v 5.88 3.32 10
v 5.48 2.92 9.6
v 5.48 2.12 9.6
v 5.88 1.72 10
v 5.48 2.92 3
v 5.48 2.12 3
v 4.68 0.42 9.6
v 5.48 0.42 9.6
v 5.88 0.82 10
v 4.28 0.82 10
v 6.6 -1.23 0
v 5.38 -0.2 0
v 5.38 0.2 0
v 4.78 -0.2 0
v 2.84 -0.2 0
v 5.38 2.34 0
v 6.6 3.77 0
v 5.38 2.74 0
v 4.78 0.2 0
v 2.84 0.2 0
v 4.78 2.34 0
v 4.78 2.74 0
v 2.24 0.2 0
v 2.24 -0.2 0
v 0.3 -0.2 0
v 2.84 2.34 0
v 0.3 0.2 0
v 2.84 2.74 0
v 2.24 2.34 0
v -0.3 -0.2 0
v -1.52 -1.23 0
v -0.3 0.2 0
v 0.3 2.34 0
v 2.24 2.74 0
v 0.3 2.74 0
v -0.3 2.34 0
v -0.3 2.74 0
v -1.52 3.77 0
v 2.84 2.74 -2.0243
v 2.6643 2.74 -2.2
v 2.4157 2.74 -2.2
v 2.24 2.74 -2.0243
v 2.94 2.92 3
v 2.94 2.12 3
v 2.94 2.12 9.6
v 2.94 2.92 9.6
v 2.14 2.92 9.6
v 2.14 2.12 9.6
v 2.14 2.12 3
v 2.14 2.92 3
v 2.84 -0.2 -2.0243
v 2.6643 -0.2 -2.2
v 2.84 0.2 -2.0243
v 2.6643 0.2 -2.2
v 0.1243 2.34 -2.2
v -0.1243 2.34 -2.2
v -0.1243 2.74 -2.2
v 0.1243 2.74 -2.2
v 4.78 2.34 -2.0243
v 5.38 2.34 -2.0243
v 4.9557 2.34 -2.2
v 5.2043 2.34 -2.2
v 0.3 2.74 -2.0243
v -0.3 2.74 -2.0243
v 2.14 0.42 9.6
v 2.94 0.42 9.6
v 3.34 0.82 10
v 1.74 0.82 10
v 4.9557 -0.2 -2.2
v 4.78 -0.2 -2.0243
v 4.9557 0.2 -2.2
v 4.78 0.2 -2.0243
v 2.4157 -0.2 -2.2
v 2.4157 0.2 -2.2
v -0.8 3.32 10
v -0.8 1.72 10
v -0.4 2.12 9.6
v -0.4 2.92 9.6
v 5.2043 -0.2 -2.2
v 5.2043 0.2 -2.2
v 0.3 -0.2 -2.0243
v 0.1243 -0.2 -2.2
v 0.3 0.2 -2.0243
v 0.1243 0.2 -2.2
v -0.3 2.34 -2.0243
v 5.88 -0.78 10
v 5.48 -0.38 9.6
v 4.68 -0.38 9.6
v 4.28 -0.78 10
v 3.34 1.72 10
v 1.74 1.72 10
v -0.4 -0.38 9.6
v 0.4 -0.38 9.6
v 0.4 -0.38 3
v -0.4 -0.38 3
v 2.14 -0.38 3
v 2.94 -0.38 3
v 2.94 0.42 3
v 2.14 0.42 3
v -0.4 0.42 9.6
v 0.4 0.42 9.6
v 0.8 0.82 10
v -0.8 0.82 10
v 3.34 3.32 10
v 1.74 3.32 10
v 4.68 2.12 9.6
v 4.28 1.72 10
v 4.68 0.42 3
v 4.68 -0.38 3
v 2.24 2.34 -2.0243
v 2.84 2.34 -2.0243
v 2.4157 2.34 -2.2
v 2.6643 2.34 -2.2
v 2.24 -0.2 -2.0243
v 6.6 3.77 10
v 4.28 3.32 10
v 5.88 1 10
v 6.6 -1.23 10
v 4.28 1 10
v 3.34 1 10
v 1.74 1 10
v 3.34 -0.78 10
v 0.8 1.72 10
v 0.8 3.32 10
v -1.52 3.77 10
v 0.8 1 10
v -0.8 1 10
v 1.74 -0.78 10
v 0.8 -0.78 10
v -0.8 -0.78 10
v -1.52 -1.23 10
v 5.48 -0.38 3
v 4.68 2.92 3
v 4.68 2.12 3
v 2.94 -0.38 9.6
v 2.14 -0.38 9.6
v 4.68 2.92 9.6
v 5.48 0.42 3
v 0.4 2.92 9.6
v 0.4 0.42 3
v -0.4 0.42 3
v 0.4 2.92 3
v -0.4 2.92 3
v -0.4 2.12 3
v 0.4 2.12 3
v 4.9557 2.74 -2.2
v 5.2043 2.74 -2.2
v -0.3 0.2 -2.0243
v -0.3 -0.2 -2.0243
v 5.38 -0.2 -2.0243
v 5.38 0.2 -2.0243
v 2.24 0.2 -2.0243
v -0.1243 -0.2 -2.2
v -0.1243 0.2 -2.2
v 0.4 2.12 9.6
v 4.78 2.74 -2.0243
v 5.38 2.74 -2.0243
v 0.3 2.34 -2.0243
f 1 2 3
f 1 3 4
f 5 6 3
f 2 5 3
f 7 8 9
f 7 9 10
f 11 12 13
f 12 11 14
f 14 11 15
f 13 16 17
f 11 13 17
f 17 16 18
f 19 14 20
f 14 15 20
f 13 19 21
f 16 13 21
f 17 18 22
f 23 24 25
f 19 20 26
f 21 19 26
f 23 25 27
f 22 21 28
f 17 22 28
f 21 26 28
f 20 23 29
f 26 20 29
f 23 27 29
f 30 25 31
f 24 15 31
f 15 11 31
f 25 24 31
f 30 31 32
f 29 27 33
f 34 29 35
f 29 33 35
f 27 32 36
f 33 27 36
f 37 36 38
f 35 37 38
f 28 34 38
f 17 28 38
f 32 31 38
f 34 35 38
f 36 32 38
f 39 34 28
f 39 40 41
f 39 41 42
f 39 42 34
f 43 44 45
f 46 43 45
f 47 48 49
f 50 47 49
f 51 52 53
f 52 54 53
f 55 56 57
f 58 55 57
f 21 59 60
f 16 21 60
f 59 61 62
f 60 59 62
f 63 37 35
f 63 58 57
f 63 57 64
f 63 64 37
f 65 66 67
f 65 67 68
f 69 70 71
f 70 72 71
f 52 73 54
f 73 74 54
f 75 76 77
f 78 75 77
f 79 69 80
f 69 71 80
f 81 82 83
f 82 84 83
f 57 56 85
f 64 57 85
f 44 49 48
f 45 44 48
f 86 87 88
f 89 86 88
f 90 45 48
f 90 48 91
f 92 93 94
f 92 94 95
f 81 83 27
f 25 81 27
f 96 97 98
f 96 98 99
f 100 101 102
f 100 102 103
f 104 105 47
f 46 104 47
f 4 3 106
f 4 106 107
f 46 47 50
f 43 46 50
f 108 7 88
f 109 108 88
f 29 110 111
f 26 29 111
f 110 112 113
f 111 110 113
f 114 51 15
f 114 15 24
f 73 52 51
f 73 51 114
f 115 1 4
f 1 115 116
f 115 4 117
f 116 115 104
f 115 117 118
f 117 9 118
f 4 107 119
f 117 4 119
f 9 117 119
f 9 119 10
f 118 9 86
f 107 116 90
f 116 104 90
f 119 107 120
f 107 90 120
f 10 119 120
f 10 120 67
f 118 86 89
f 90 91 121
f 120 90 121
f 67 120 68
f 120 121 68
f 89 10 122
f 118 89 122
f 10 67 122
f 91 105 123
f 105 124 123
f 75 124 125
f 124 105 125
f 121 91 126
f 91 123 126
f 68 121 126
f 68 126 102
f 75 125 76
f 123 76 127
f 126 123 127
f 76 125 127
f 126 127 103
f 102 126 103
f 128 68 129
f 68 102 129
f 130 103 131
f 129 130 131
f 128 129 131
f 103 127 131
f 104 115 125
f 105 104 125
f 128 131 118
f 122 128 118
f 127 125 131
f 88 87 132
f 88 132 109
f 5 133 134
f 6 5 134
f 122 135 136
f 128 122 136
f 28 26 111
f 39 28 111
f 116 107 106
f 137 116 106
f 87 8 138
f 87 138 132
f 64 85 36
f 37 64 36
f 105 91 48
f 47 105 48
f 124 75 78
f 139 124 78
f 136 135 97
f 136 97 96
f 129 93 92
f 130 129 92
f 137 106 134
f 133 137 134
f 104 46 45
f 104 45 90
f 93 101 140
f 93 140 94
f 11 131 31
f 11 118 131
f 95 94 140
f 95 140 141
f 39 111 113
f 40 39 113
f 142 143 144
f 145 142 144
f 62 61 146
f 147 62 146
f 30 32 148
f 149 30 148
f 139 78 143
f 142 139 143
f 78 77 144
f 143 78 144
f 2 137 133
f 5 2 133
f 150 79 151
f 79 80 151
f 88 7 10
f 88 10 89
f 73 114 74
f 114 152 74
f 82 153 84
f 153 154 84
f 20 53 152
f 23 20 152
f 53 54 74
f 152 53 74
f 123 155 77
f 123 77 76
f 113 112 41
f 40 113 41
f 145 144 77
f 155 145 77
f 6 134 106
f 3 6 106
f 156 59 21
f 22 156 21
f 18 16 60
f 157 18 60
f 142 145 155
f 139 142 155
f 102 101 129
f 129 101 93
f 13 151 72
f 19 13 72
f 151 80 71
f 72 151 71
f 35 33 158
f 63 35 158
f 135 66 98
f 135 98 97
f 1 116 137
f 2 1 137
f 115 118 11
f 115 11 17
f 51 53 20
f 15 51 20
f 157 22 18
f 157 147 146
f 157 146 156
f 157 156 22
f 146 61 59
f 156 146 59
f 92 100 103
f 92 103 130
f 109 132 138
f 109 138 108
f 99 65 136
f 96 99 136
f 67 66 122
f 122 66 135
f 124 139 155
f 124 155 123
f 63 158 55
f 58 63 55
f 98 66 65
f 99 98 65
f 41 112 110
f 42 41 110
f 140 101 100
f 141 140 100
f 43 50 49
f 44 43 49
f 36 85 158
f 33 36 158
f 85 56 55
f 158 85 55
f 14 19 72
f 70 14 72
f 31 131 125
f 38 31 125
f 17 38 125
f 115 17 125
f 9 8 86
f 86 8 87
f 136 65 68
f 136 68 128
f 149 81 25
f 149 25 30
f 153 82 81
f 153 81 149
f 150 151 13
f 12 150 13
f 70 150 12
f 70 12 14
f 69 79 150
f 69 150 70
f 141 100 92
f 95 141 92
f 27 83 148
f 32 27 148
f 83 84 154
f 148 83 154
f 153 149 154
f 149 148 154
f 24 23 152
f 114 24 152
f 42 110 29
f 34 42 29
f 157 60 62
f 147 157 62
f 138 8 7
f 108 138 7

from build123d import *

# Parameters (mm, degrees)
SKETCH1_W            = 2.5
SKETCH1_H            = 10
BOSS_EXTRUDE1_DEPTH  = 1.52
SKETCH2_W            = 0.8
SKETCH2_H            = 0.8
CUT_EXTRUDE1_DEPTH   = 7
CHAMFER_1_SIZE       = 0.4
BOSS_EXTRUDE2_DEPTH  = 0.2
MIRROR_START         = -1.52
MIRROR_1_DEPTH       = 3.04
MIRROR_1_2_DEPTH     = 0.72
MIRROR_START_2       = 0.8
MIRROR_1_3_DEPTH     = 0.72
MIRROR_START_3       = -0.124264069
MIRROR_1_4_OUTLINE_W = 0.4
MIRROR_1_4_OUTLINE_H = 2.2
MIRROR_1_4_DEPTH     = 0.248528138
MIRROR_START_4       = 1
MIRROR_1_5_DEPTH     = 2.32
MIRROR_START_5       = 2.34
MIRROR_1_6_DEPTH     = 0.4
LPATTERN1_COUNT      = 3
LPATTERN1_PITCH      = 2.54


with BuildPart() as part:
    # Sketch1 → Boss-Extrude1 (new, symmetric)
    with BuildSketch(Plane(origin=(0, 0, 0), x_dir=(0, -1, 0), z_dir=(1, 0, 0))):
        with Locations((-0.02, -5)):
            Rectangle(SKETCH1_W, SKETCH1_H)
    extrude(amount=BOSS_EXTRUDE1_DEPTH, both=True)

    # Sketch2 → Cut-Extrude1 (cut)
    with BuildSketch(Plane(origin=(0, 0, 10), x_dir=(-1, 0, 0), z_dir=(0, 0, 1))):
        with Locations((0, -0.02)):
            Rectangle(SKETCH2_W, SKETCH2_H)
    extrude(amount=-CUT_EXTRUDE1_DEPTH, mode=Mode.SUBTRACT)

    # Фаска1
    chamfer_1_edges = [part.edges().sort_by_distance(p)[0] for p in [
        (-0.4, 0.02, 10),
        (0, -0.38, 10),
        (0.4, 0.02, 10),
        (0, 0.42, 10),
    ]]
    chamfer(chamfer_1_edges, length=CHAMFER_1_SIZE)

    # Sketch3 → Boss-Extrude2 (add, symmetric)
    with BuildSketch(Plane(origin=(0, 0, 0), x_dir=(1, 0, 0), z_dir=(0, 1, 0))):
        Polygon((-0.3, 0), (-0.3, 2.024264069), (-0.124264069, 2.2), (0.124264069, 2.2), (0.3, 2.024264069), (0.3, 0), align=None)
    extrude(amount=BOSS_EXTRUDE2_DEPTH, both=True)

    # Зеркальное отражение1: read off the stored shape, not the designer's step
    # Зеркальное отражение1 outline → Зеркальное отражение1 (add)
    with BuildSketch(Plane.YZ.offset(MIRROR_START)):
        Polygon((1.72, 10), (1.27, 10), (1.27, 0), (3.77, 0), (3.77, 10), (3.32, 10), (2.92, 9.6), (2.92, 3), (2.12, 3), (2.12, 9.6), align=None)
    extrude(amount=MIRROR_1_DEPTH)

    # Mirror 1 2 outline → Mirror 1 2 (add)
    with BuildSketch(Plane.YZ.offset(MIRROR_START)):
        Polygon((3.32, 10), (1.72, 10), (2.12, 9.6), (2.12, 3), (2.92, 3), (2.92, 9.6), align=None)
    extrude(amount=MIRROR_1_2_DEPTH)

    # Mirror 1 3 outline → Mirror 1 3 (add)
    with BuildSketch(Plane.YZ.offset(MIRROR_START_2)):
        Polygon((3.32, 10), (1.72, 10), (2.12, 9.6), (2.12, 3), (2.92, 3), (2.92, 9.6), align=None)
    extrude(amount=MIRROR_1_3_DEPTH)

    # Mirror 1 4 outline → Mirror 1 4 (add)
    with BuildSketch(Plane.YZ.offset(MIRROR_START_3)):
        with Locations((2.54, -1.1)):
            Rectangle(MIRROR_1_4_OUTLINE_W, MIRROR_1_4_OUTLINE_H)
    extrude(amount=MIRROR_1_4_DEPTH)

    # Mirror 1 5 outline → Mirror 1 5 (add)
    with BuildSketch(Plane(origin=(0, 0, 0), x_dir=(1, 0, 0), z_dir=(0, 1, 0)).offset(MIRROR_START_4)):
        Polygon((-0.8, -10), (-0.4, -9.6), (-0.4, -3), (-0.8, -3), align=None)
        Polygon((0.8, -3), (0.4, -3), (0.4, -9.6), (0.8, -10), align=None)
    extrude(amount=MIRROR_1_5_DEPTH)

    # Mirror 1 6 outline → Mirror 1 6 (add)
    with BuildSketch(Plane(origin=(0, 0, 0), x_dir=(1, 0, 0), z_dir=(0, 1, 0)).offset(MIRROR_START_5)):
        Polygon((0.124264069, 0), (0.3, 0), (0.3, 2.024264069), (0.124264069, 2.2), align=None)
        Polygon((-0.3, 0), (-0.124264069, 0), (-0.124264069, 2.2), (-0.3, 2.024264069), align=None)
    extrude(amount=MIRROR_1_6_DEPTH)


with BuildPart() as lpattern1_1:
    # LPattern1: pattern copy
    add(part.part.moved(Location(Vector(1, 0, 0) * (1 * LPATTERN1_PITCH))))


with BuildPart() as lpattern1_2:
    # LPattern1: pattern copy
    add(part.part.moved(Location(Vector(1, 0, 0) * (2 * LPATTERN1_PITCH))))

    # Combine 1: union LPattern1_1, part
    add(lpattern1_1.part)
    add(part.part)


solid = lpattern1_2.part
